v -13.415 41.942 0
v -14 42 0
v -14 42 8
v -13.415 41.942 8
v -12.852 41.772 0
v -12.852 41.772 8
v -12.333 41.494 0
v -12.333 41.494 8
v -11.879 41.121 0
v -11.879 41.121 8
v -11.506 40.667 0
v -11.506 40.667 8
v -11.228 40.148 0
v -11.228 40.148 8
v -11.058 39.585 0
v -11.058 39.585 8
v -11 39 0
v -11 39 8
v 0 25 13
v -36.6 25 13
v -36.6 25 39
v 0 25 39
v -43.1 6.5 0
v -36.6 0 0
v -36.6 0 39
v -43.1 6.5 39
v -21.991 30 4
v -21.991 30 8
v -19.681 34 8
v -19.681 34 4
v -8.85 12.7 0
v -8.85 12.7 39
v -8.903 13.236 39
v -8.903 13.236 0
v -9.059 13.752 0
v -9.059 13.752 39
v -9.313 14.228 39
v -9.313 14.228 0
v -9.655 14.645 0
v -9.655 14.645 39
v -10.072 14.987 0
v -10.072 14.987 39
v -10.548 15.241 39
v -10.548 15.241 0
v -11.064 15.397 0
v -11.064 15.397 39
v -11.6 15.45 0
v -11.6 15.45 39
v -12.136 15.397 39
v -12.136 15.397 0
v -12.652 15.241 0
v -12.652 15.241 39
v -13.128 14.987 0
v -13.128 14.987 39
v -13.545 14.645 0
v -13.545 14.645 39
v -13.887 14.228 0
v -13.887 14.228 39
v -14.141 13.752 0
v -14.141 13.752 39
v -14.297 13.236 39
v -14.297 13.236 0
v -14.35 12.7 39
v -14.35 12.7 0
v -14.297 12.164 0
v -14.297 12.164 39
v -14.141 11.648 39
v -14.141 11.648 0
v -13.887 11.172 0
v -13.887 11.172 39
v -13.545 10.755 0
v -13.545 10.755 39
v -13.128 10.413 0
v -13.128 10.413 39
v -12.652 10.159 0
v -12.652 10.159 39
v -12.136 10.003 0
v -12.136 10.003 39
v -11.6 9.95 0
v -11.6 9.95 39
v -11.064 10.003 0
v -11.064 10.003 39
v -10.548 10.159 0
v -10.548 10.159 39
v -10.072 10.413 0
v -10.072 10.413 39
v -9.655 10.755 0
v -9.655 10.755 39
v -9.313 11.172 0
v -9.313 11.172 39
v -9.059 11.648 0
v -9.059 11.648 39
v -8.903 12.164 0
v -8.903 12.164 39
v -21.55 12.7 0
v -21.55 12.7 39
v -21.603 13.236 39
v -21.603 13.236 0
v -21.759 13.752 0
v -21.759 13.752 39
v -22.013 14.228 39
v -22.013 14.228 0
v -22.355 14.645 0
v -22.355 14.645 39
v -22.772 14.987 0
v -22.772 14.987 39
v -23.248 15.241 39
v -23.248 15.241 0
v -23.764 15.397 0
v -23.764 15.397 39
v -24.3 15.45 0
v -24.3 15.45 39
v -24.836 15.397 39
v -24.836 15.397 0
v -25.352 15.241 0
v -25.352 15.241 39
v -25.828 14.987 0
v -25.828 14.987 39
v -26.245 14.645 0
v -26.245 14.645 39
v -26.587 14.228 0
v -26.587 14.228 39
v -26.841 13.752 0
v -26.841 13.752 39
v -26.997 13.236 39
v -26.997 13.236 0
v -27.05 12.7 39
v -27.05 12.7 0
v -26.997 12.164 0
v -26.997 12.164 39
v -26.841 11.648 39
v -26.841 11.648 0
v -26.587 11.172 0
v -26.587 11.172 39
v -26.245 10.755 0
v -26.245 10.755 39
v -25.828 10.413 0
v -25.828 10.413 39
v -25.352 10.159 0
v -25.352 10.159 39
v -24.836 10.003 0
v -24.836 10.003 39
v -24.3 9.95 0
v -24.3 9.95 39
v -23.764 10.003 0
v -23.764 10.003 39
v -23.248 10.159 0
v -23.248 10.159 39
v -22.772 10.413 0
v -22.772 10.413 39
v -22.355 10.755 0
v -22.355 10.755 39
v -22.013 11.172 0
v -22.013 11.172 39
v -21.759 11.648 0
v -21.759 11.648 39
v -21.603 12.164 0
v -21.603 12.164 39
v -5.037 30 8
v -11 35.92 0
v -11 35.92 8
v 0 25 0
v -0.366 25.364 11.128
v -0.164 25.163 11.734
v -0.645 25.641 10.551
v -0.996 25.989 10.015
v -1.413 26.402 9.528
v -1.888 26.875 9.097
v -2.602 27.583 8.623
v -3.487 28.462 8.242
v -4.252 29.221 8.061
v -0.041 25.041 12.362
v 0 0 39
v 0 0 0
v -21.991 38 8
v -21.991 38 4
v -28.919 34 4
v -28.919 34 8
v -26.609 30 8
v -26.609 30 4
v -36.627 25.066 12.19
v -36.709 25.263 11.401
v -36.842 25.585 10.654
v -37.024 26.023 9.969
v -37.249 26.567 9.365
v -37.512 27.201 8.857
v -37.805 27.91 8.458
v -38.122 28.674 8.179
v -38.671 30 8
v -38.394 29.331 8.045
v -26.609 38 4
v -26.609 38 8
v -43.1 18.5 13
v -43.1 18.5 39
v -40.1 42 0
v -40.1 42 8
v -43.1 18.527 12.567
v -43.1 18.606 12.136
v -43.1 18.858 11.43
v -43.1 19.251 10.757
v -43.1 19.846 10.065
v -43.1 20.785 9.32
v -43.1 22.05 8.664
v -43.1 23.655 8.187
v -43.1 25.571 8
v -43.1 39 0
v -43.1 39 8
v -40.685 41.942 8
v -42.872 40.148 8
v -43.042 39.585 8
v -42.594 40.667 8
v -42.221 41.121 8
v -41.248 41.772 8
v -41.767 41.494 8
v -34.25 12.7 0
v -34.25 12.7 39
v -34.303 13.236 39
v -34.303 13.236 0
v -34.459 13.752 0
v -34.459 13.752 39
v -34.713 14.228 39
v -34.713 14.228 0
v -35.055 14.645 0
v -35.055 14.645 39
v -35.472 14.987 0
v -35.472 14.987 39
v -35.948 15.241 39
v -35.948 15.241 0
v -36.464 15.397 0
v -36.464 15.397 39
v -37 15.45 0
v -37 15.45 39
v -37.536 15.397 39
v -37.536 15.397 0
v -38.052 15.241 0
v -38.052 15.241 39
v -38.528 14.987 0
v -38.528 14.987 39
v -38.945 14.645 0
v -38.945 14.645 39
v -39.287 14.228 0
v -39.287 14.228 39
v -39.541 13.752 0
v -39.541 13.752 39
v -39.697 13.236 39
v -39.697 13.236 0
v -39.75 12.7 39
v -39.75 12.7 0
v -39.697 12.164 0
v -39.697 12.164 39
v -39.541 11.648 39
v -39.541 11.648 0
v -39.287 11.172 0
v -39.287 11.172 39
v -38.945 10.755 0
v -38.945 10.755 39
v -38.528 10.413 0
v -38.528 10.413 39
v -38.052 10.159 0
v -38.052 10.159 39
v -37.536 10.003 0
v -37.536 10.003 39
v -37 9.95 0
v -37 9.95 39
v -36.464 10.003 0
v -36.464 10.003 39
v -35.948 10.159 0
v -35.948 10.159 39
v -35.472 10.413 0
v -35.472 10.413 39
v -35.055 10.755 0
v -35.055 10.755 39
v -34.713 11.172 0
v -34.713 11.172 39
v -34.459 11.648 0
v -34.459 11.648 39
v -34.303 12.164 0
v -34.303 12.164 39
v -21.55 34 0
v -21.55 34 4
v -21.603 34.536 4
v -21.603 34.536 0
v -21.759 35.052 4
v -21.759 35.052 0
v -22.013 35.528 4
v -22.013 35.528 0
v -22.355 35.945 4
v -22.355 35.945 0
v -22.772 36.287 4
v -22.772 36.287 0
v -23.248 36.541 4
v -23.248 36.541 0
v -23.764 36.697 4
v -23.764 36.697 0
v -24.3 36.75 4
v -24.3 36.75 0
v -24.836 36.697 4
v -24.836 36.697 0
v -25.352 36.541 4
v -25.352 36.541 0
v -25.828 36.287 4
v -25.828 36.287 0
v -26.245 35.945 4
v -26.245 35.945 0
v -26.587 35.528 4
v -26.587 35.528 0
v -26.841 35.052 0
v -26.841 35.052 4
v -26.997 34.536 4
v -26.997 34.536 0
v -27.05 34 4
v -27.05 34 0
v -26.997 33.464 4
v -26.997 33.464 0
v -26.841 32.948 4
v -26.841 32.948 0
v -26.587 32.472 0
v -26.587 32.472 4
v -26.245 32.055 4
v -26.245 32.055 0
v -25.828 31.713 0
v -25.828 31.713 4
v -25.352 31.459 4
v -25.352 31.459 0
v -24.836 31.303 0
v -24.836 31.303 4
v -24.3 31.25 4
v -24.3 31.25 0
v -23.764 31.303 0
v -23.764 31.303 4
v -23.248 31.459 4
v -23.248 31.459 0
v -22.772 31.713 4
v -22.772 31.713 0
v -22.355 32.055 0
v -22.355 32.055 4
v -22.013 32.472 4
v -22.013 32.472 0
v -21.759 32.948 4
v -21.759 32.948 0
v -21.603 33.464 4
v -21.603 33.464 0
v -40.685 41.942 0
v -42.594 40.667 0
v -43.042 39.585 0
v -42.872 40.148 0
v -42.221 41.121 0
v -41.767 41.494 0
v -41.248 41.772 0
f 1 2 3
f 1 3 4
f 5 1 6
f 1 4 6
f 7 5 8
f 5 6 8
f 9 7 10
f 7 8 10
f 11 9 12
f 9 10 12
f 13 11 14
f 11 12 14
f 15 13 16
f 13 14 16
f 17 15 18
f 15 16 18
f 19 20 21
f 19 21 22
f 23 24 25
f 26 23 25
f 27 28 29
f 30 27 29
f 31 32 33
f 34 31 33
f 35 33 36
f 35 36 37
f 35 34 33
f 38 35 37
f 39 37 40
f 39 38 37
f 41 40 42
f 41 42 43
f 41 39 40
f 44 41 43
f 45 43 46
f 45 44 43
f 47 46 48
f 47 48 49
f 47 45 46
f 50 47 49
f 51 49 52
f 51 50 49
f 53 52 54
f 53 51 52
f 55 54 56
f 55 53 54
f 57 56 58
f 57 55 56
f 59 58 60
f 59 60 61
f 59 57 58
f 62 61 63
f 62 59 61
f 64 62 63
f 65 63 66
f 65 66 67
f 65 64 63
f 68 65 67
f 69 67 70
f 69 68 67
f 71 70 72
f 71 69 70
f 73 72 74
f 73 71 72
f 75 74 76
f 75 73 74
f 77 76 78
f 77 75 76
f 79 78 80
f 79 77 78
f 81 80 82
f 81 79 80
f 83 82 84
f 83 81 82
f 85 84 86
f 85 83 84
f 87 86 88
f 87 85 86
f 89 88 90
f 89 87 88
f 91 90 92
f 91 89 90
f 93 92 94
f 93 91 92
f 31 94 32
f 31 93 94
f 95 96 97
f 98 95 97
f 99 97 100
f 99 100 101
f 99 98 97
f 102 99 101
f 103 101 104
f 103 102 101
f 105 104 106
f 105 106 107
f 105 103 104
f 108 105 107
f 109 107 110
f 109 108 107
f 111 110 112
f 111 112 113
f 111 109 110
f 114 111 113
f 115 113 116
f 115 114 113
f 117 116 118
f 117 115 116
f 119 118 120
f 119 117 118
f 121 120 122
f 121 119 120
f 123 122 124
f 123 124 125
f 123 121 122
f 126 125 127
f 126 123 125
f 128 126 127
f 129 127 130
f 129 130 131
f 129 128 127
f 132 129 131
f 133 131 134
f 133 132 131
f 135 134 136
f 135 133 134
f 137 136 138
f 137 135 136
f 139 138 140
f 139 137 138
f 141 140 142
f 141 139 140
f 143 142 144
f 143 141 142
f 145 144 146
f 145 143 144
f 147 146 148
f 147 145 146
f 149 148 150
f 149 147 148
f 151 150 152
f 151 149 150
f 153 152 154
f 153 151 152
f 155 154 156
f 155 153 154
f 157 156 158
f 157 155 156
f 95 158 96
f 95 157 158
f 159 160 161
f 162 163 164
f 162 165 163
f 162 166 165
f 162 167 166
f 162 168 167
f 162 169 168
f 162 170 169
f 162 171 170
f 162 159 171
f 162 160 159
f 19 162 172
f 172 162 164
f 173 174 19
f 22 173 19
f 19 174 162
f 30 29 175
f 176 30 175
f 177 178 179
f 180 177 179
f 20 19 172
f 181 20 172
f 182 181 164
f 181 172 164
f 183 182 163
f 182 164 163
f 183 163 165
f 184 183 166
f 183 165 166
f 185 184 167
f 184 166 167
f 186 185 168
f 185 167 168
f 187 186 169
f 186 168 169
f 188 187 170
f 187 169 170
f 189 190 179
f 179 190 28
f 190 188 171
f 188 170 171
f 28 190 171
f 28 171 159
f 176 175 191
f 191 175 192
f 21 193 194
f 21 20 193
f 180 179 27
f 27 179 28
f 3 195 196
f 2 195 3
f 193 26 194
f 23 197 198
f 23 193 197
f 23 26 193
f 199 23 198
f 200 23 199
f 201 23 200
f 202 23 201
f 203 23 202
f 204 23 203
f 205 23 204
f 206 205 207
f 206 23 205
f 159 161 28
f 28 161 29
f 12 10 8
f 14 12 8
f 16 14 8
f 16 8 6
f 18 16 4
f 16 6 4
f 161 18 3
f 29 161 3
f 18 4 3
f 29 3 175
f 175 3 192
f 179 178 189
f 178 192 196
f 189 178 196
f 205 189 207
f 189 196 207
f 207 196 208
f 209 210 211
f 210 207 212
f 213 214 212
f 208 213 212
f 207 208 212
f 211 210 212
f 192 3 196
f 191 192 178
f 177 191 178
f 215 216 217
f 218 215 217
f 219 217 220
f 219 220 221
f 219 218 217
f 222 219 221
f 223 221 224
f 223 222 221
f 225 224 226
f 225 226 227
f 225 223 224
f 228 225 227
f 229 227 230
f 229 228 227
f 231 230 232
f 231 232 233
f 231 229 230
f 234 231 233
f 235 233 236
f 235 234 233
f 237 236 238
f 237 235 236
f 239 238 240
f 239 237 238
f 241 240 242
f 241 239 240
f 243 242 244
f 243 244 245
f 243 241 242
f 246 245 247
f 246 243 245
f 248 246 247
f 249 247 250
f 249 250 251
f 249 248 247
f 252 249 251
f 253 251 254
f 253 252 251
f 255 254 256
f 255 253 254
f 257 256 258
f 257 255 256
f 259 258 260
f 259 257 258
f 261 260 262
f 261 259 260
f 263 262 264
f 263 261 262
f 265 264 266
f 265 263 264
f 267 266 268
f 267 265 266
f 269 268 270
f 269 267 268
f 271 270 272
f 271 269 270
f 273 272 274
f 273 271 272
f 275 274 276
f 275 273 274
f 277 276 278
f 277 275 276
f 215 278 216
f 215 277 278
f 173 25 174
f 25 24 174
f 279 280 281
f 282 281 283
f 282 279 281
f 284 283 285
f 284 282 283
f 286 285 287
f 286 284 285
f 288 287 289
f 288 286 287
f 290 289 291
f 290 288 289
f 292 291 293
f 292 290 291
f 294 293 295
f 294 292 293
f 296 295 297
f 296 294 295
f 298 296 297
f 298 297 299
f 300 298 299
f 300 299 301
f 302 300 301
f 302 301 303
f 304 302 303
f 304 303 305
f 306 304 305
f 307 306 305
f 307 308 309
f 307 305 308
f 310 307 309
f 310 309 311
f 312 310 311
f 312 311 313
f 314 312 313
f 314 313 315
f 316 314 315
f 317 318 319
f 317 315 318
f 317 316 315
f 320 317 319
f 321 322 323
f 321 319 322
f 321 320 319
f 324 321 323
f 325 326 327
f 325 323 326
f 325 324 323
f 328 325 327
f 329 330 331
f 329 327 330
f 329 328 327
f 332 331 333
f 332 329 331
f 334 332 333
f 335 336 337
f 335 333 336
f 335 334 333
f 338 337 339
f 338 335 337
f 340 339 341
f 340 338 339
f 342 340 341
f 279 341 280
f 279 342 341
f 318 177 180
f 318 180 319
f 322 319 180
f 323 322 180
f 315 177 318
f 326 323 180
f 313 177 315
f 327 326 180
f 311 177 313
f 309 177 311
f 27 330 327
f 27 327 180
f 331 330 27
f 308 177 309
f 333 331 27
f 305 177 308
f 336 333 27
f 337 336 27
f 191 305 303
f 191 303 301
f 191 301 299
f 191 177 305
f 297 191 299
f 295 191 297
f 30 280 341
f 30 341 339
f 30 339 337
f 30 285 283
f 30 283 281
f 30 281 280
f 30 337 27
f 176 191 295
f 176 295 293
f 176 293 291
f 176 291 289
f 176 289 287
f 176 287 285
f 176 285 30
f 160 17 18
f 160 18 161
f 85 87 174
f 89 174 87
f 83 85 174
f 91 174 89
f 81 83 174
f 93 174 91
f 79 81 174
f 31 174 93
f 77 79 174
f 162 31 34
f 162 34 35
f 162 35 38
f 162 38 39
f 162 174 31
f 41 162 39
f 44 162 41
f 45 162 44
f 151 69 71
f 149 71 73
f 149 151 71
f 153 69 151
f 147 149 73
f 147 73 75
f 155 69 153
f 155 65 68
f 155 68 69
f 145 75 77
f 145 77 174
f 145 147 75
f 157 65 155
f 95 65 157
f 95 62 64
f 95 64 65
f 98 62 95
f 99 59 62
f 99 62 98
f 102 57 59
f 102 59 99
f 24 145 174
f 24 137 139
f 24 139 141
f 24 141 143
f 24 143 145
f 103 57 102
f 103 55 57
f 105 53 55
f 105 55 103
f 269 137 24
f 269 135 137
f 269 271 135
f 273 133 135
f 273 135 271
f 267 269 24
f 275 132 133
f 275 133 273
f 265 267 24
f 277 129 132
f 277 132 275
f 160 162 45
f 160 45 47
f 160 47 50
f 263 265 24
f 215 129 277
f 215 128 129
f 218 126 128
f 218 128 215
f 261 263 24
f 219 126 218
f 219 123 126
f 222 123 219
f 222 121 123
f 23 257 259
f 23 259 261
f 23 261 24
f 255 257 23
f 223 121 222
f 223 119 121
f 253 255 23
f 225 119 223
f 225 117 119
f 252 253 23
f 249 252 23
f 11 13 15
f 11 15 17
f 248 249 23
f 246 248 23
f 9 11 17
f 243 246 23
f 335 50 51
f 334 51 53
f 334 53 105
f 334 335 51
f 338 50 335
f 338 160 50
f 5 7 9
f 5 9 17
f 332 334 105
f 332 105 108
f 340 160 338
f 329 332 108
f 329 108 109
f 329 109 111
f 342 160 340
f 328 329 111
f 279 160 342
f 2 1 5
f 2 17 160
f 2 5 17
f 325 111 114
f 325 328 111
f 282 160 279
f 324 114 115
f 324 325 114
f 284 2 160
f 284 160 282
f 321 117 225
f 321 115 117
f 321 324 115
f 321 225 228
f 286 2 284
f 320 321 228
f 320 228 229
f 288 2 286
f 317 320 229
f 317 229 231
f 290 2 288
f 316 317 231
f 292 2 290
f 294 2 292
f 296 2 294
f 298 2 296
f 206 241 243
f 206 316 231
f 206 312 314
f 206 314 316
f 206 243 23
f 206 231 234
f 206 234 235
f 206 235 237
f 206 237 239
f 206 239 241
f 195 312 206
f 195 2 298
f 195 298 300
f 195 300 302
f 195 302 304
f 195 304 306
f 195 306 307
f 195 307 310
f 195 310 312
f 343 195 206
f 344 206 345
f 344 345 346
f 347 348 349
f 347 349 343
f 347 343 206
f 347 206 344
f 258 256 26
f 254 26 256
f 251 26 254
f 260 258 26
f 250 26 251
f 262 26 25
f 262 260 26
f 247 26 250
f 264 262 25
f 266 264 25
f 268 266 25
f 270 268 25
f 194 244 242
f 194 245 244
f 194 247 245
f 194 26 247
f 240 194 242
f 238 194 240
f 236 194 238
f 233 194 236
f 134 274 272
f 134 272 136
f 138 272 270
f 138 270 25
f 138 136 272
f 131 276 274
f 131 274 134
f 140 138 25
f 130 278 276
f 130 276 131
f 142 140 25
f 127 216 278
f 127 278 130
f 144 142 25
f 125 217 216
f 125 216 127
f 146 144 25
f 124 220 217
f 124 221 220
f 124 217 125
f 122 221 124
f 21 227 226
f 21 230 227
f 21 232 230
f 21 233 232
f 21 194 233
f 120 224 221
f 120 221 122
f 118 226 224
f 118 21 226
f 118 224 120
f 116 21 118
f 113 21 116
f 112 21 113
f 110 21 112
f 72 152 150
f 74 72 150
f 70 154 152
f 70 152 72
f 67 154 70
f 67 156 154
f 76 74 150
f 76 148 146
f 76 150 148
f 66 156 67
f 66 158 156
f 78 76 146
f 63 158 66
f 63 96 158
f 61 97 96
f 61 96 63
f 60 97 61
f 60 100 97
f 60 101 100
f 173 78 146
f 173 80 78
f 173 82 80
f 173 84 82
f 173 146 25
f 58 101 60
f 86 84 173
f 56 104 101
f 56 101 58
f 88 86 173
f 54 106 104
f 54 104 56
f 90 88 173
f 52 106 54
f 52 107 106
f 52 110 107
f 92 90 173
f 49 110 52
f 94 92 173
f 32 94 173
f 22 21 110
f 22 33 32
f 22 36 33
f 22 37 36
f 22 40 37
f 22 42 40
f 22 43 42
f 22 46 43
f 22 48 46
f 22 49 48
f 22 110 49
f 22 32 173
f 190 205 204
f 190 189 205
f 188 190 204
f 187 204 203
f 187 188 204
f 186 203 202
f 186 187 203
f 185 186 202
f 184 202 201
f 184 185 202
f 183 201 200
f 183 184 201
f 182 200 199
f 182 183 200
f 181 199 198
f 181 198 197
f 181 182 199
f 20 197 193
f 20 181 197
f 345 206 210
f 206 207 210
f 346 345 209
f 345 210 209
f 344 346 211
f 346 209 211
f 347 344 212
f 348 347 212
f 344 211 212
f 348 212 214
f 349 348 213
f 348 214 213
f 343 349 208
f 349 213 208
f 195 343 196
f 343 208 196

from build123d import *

# Parameters (mm, degrees)
SKETCH1_R           = 2.75
BOSS_EXTRUDE1_DEPTH = 8
SKETCH2_W           = 43.1
SKETCH2_H           = 25
SKETCH2_R           = 2.75
BOSS_EXTRUDE2_DEPTH = 31
CHAMFER1_SIZE       = 6.5
FILLET1_R           = 5
CUT_EXTRUDE1_DEPTH  = 4
FILLET2_R           = 3


with BuildPart() as part:
    # Sketch1 → Boss-Extrude1 (new body)
    with BuildSketch(Plane.XY):
        Polygon((0, 0), (-43.1, 0), (-43.1, 42), (-11, 42), (-11, 35.920164834), (0, 25), align=None)
        with Locations((-11.6, 12.7)):
            Circle(SKETCH1_R, mode=Mode.SUBTRACT)
        with Locations((-24.3, 12.7)):
            Circle(SKETCH1_R, mode=Mode.SUBTRACT)
        with Locations((-37, 12.7)):
            Circle(SKETCH1_R, mode=Mode.SUBTRACT)
        with Locations((-24.3, 34)):
            Circle(SKETCH1_R, mode=Mode.SUBTRACT)
    extrude(amount=BOSS_EXTRUDE1_DEPTH)

    # Sketch2 → Boss-Extrude2 (add)
    with BuildSketch(Plane.XY.offset(8)):
        with Locations((-21.55, 12.5)):
            Rectangle(SKETCH2_W, SKETCH2_H)
        with Locations((-11.6, 12.7)):
            Circle(SKETCH2_R, mode=Mode.SUBTRACT)
        with Locations((-24.3, 12.7)):
            Circle(SKETCH2_R, mode=Mode.SUBTRACT)
        with Locations((-37, 12.7)):
            Circle(SKETCH2_R, mode=Mode.SUBTRACT)
    extrude(amount=BOSS_EXTRUDE2_DEPTH)

    # Chamfer1
    chamfer1_edges = [part.edges().sort_by_distance(p)[0] for p in [
        (-43.1, 0, 19.5),
        (-43.1, 25, 23.5),
    ]]
    chamfer(chamfer1_edges, length=CHAMFER1_SIZE)

    # Fillet1
    fillet1_edges = [part.edges().sort_by_distance(p)[0] for p in [
        (-18.3, 25, 8),
        (-39.85, 21.75, 8),
    ]]
    fillet(fillet1_edges, radius=FILLET1_R)

    # Sketch3 → Cut-Extrude1 (cut)
    with BuildSketch(Plane.XY.offset(8)):
        Polygon((-19.681197846, 34), (-21.990598923, 38), (-26.609401077, 38), (-28.918802154, 34), (-26.609401077, 30), (-21.990598923, 30), align=None)
    extrude(amount=-CUT_EXTRUDE1_DEPTH, mode=Mode.SUBTRACT)

    # Fillet2
    fillet2_edges = [part.edges().sort_by_distance(p)[0] for p in [
        (-43.1, 42, 4),
        (-11, 42, 4),
    ]]
    fillet(fillet2_edges, radius=FILLET2_R)


solid = part.part
